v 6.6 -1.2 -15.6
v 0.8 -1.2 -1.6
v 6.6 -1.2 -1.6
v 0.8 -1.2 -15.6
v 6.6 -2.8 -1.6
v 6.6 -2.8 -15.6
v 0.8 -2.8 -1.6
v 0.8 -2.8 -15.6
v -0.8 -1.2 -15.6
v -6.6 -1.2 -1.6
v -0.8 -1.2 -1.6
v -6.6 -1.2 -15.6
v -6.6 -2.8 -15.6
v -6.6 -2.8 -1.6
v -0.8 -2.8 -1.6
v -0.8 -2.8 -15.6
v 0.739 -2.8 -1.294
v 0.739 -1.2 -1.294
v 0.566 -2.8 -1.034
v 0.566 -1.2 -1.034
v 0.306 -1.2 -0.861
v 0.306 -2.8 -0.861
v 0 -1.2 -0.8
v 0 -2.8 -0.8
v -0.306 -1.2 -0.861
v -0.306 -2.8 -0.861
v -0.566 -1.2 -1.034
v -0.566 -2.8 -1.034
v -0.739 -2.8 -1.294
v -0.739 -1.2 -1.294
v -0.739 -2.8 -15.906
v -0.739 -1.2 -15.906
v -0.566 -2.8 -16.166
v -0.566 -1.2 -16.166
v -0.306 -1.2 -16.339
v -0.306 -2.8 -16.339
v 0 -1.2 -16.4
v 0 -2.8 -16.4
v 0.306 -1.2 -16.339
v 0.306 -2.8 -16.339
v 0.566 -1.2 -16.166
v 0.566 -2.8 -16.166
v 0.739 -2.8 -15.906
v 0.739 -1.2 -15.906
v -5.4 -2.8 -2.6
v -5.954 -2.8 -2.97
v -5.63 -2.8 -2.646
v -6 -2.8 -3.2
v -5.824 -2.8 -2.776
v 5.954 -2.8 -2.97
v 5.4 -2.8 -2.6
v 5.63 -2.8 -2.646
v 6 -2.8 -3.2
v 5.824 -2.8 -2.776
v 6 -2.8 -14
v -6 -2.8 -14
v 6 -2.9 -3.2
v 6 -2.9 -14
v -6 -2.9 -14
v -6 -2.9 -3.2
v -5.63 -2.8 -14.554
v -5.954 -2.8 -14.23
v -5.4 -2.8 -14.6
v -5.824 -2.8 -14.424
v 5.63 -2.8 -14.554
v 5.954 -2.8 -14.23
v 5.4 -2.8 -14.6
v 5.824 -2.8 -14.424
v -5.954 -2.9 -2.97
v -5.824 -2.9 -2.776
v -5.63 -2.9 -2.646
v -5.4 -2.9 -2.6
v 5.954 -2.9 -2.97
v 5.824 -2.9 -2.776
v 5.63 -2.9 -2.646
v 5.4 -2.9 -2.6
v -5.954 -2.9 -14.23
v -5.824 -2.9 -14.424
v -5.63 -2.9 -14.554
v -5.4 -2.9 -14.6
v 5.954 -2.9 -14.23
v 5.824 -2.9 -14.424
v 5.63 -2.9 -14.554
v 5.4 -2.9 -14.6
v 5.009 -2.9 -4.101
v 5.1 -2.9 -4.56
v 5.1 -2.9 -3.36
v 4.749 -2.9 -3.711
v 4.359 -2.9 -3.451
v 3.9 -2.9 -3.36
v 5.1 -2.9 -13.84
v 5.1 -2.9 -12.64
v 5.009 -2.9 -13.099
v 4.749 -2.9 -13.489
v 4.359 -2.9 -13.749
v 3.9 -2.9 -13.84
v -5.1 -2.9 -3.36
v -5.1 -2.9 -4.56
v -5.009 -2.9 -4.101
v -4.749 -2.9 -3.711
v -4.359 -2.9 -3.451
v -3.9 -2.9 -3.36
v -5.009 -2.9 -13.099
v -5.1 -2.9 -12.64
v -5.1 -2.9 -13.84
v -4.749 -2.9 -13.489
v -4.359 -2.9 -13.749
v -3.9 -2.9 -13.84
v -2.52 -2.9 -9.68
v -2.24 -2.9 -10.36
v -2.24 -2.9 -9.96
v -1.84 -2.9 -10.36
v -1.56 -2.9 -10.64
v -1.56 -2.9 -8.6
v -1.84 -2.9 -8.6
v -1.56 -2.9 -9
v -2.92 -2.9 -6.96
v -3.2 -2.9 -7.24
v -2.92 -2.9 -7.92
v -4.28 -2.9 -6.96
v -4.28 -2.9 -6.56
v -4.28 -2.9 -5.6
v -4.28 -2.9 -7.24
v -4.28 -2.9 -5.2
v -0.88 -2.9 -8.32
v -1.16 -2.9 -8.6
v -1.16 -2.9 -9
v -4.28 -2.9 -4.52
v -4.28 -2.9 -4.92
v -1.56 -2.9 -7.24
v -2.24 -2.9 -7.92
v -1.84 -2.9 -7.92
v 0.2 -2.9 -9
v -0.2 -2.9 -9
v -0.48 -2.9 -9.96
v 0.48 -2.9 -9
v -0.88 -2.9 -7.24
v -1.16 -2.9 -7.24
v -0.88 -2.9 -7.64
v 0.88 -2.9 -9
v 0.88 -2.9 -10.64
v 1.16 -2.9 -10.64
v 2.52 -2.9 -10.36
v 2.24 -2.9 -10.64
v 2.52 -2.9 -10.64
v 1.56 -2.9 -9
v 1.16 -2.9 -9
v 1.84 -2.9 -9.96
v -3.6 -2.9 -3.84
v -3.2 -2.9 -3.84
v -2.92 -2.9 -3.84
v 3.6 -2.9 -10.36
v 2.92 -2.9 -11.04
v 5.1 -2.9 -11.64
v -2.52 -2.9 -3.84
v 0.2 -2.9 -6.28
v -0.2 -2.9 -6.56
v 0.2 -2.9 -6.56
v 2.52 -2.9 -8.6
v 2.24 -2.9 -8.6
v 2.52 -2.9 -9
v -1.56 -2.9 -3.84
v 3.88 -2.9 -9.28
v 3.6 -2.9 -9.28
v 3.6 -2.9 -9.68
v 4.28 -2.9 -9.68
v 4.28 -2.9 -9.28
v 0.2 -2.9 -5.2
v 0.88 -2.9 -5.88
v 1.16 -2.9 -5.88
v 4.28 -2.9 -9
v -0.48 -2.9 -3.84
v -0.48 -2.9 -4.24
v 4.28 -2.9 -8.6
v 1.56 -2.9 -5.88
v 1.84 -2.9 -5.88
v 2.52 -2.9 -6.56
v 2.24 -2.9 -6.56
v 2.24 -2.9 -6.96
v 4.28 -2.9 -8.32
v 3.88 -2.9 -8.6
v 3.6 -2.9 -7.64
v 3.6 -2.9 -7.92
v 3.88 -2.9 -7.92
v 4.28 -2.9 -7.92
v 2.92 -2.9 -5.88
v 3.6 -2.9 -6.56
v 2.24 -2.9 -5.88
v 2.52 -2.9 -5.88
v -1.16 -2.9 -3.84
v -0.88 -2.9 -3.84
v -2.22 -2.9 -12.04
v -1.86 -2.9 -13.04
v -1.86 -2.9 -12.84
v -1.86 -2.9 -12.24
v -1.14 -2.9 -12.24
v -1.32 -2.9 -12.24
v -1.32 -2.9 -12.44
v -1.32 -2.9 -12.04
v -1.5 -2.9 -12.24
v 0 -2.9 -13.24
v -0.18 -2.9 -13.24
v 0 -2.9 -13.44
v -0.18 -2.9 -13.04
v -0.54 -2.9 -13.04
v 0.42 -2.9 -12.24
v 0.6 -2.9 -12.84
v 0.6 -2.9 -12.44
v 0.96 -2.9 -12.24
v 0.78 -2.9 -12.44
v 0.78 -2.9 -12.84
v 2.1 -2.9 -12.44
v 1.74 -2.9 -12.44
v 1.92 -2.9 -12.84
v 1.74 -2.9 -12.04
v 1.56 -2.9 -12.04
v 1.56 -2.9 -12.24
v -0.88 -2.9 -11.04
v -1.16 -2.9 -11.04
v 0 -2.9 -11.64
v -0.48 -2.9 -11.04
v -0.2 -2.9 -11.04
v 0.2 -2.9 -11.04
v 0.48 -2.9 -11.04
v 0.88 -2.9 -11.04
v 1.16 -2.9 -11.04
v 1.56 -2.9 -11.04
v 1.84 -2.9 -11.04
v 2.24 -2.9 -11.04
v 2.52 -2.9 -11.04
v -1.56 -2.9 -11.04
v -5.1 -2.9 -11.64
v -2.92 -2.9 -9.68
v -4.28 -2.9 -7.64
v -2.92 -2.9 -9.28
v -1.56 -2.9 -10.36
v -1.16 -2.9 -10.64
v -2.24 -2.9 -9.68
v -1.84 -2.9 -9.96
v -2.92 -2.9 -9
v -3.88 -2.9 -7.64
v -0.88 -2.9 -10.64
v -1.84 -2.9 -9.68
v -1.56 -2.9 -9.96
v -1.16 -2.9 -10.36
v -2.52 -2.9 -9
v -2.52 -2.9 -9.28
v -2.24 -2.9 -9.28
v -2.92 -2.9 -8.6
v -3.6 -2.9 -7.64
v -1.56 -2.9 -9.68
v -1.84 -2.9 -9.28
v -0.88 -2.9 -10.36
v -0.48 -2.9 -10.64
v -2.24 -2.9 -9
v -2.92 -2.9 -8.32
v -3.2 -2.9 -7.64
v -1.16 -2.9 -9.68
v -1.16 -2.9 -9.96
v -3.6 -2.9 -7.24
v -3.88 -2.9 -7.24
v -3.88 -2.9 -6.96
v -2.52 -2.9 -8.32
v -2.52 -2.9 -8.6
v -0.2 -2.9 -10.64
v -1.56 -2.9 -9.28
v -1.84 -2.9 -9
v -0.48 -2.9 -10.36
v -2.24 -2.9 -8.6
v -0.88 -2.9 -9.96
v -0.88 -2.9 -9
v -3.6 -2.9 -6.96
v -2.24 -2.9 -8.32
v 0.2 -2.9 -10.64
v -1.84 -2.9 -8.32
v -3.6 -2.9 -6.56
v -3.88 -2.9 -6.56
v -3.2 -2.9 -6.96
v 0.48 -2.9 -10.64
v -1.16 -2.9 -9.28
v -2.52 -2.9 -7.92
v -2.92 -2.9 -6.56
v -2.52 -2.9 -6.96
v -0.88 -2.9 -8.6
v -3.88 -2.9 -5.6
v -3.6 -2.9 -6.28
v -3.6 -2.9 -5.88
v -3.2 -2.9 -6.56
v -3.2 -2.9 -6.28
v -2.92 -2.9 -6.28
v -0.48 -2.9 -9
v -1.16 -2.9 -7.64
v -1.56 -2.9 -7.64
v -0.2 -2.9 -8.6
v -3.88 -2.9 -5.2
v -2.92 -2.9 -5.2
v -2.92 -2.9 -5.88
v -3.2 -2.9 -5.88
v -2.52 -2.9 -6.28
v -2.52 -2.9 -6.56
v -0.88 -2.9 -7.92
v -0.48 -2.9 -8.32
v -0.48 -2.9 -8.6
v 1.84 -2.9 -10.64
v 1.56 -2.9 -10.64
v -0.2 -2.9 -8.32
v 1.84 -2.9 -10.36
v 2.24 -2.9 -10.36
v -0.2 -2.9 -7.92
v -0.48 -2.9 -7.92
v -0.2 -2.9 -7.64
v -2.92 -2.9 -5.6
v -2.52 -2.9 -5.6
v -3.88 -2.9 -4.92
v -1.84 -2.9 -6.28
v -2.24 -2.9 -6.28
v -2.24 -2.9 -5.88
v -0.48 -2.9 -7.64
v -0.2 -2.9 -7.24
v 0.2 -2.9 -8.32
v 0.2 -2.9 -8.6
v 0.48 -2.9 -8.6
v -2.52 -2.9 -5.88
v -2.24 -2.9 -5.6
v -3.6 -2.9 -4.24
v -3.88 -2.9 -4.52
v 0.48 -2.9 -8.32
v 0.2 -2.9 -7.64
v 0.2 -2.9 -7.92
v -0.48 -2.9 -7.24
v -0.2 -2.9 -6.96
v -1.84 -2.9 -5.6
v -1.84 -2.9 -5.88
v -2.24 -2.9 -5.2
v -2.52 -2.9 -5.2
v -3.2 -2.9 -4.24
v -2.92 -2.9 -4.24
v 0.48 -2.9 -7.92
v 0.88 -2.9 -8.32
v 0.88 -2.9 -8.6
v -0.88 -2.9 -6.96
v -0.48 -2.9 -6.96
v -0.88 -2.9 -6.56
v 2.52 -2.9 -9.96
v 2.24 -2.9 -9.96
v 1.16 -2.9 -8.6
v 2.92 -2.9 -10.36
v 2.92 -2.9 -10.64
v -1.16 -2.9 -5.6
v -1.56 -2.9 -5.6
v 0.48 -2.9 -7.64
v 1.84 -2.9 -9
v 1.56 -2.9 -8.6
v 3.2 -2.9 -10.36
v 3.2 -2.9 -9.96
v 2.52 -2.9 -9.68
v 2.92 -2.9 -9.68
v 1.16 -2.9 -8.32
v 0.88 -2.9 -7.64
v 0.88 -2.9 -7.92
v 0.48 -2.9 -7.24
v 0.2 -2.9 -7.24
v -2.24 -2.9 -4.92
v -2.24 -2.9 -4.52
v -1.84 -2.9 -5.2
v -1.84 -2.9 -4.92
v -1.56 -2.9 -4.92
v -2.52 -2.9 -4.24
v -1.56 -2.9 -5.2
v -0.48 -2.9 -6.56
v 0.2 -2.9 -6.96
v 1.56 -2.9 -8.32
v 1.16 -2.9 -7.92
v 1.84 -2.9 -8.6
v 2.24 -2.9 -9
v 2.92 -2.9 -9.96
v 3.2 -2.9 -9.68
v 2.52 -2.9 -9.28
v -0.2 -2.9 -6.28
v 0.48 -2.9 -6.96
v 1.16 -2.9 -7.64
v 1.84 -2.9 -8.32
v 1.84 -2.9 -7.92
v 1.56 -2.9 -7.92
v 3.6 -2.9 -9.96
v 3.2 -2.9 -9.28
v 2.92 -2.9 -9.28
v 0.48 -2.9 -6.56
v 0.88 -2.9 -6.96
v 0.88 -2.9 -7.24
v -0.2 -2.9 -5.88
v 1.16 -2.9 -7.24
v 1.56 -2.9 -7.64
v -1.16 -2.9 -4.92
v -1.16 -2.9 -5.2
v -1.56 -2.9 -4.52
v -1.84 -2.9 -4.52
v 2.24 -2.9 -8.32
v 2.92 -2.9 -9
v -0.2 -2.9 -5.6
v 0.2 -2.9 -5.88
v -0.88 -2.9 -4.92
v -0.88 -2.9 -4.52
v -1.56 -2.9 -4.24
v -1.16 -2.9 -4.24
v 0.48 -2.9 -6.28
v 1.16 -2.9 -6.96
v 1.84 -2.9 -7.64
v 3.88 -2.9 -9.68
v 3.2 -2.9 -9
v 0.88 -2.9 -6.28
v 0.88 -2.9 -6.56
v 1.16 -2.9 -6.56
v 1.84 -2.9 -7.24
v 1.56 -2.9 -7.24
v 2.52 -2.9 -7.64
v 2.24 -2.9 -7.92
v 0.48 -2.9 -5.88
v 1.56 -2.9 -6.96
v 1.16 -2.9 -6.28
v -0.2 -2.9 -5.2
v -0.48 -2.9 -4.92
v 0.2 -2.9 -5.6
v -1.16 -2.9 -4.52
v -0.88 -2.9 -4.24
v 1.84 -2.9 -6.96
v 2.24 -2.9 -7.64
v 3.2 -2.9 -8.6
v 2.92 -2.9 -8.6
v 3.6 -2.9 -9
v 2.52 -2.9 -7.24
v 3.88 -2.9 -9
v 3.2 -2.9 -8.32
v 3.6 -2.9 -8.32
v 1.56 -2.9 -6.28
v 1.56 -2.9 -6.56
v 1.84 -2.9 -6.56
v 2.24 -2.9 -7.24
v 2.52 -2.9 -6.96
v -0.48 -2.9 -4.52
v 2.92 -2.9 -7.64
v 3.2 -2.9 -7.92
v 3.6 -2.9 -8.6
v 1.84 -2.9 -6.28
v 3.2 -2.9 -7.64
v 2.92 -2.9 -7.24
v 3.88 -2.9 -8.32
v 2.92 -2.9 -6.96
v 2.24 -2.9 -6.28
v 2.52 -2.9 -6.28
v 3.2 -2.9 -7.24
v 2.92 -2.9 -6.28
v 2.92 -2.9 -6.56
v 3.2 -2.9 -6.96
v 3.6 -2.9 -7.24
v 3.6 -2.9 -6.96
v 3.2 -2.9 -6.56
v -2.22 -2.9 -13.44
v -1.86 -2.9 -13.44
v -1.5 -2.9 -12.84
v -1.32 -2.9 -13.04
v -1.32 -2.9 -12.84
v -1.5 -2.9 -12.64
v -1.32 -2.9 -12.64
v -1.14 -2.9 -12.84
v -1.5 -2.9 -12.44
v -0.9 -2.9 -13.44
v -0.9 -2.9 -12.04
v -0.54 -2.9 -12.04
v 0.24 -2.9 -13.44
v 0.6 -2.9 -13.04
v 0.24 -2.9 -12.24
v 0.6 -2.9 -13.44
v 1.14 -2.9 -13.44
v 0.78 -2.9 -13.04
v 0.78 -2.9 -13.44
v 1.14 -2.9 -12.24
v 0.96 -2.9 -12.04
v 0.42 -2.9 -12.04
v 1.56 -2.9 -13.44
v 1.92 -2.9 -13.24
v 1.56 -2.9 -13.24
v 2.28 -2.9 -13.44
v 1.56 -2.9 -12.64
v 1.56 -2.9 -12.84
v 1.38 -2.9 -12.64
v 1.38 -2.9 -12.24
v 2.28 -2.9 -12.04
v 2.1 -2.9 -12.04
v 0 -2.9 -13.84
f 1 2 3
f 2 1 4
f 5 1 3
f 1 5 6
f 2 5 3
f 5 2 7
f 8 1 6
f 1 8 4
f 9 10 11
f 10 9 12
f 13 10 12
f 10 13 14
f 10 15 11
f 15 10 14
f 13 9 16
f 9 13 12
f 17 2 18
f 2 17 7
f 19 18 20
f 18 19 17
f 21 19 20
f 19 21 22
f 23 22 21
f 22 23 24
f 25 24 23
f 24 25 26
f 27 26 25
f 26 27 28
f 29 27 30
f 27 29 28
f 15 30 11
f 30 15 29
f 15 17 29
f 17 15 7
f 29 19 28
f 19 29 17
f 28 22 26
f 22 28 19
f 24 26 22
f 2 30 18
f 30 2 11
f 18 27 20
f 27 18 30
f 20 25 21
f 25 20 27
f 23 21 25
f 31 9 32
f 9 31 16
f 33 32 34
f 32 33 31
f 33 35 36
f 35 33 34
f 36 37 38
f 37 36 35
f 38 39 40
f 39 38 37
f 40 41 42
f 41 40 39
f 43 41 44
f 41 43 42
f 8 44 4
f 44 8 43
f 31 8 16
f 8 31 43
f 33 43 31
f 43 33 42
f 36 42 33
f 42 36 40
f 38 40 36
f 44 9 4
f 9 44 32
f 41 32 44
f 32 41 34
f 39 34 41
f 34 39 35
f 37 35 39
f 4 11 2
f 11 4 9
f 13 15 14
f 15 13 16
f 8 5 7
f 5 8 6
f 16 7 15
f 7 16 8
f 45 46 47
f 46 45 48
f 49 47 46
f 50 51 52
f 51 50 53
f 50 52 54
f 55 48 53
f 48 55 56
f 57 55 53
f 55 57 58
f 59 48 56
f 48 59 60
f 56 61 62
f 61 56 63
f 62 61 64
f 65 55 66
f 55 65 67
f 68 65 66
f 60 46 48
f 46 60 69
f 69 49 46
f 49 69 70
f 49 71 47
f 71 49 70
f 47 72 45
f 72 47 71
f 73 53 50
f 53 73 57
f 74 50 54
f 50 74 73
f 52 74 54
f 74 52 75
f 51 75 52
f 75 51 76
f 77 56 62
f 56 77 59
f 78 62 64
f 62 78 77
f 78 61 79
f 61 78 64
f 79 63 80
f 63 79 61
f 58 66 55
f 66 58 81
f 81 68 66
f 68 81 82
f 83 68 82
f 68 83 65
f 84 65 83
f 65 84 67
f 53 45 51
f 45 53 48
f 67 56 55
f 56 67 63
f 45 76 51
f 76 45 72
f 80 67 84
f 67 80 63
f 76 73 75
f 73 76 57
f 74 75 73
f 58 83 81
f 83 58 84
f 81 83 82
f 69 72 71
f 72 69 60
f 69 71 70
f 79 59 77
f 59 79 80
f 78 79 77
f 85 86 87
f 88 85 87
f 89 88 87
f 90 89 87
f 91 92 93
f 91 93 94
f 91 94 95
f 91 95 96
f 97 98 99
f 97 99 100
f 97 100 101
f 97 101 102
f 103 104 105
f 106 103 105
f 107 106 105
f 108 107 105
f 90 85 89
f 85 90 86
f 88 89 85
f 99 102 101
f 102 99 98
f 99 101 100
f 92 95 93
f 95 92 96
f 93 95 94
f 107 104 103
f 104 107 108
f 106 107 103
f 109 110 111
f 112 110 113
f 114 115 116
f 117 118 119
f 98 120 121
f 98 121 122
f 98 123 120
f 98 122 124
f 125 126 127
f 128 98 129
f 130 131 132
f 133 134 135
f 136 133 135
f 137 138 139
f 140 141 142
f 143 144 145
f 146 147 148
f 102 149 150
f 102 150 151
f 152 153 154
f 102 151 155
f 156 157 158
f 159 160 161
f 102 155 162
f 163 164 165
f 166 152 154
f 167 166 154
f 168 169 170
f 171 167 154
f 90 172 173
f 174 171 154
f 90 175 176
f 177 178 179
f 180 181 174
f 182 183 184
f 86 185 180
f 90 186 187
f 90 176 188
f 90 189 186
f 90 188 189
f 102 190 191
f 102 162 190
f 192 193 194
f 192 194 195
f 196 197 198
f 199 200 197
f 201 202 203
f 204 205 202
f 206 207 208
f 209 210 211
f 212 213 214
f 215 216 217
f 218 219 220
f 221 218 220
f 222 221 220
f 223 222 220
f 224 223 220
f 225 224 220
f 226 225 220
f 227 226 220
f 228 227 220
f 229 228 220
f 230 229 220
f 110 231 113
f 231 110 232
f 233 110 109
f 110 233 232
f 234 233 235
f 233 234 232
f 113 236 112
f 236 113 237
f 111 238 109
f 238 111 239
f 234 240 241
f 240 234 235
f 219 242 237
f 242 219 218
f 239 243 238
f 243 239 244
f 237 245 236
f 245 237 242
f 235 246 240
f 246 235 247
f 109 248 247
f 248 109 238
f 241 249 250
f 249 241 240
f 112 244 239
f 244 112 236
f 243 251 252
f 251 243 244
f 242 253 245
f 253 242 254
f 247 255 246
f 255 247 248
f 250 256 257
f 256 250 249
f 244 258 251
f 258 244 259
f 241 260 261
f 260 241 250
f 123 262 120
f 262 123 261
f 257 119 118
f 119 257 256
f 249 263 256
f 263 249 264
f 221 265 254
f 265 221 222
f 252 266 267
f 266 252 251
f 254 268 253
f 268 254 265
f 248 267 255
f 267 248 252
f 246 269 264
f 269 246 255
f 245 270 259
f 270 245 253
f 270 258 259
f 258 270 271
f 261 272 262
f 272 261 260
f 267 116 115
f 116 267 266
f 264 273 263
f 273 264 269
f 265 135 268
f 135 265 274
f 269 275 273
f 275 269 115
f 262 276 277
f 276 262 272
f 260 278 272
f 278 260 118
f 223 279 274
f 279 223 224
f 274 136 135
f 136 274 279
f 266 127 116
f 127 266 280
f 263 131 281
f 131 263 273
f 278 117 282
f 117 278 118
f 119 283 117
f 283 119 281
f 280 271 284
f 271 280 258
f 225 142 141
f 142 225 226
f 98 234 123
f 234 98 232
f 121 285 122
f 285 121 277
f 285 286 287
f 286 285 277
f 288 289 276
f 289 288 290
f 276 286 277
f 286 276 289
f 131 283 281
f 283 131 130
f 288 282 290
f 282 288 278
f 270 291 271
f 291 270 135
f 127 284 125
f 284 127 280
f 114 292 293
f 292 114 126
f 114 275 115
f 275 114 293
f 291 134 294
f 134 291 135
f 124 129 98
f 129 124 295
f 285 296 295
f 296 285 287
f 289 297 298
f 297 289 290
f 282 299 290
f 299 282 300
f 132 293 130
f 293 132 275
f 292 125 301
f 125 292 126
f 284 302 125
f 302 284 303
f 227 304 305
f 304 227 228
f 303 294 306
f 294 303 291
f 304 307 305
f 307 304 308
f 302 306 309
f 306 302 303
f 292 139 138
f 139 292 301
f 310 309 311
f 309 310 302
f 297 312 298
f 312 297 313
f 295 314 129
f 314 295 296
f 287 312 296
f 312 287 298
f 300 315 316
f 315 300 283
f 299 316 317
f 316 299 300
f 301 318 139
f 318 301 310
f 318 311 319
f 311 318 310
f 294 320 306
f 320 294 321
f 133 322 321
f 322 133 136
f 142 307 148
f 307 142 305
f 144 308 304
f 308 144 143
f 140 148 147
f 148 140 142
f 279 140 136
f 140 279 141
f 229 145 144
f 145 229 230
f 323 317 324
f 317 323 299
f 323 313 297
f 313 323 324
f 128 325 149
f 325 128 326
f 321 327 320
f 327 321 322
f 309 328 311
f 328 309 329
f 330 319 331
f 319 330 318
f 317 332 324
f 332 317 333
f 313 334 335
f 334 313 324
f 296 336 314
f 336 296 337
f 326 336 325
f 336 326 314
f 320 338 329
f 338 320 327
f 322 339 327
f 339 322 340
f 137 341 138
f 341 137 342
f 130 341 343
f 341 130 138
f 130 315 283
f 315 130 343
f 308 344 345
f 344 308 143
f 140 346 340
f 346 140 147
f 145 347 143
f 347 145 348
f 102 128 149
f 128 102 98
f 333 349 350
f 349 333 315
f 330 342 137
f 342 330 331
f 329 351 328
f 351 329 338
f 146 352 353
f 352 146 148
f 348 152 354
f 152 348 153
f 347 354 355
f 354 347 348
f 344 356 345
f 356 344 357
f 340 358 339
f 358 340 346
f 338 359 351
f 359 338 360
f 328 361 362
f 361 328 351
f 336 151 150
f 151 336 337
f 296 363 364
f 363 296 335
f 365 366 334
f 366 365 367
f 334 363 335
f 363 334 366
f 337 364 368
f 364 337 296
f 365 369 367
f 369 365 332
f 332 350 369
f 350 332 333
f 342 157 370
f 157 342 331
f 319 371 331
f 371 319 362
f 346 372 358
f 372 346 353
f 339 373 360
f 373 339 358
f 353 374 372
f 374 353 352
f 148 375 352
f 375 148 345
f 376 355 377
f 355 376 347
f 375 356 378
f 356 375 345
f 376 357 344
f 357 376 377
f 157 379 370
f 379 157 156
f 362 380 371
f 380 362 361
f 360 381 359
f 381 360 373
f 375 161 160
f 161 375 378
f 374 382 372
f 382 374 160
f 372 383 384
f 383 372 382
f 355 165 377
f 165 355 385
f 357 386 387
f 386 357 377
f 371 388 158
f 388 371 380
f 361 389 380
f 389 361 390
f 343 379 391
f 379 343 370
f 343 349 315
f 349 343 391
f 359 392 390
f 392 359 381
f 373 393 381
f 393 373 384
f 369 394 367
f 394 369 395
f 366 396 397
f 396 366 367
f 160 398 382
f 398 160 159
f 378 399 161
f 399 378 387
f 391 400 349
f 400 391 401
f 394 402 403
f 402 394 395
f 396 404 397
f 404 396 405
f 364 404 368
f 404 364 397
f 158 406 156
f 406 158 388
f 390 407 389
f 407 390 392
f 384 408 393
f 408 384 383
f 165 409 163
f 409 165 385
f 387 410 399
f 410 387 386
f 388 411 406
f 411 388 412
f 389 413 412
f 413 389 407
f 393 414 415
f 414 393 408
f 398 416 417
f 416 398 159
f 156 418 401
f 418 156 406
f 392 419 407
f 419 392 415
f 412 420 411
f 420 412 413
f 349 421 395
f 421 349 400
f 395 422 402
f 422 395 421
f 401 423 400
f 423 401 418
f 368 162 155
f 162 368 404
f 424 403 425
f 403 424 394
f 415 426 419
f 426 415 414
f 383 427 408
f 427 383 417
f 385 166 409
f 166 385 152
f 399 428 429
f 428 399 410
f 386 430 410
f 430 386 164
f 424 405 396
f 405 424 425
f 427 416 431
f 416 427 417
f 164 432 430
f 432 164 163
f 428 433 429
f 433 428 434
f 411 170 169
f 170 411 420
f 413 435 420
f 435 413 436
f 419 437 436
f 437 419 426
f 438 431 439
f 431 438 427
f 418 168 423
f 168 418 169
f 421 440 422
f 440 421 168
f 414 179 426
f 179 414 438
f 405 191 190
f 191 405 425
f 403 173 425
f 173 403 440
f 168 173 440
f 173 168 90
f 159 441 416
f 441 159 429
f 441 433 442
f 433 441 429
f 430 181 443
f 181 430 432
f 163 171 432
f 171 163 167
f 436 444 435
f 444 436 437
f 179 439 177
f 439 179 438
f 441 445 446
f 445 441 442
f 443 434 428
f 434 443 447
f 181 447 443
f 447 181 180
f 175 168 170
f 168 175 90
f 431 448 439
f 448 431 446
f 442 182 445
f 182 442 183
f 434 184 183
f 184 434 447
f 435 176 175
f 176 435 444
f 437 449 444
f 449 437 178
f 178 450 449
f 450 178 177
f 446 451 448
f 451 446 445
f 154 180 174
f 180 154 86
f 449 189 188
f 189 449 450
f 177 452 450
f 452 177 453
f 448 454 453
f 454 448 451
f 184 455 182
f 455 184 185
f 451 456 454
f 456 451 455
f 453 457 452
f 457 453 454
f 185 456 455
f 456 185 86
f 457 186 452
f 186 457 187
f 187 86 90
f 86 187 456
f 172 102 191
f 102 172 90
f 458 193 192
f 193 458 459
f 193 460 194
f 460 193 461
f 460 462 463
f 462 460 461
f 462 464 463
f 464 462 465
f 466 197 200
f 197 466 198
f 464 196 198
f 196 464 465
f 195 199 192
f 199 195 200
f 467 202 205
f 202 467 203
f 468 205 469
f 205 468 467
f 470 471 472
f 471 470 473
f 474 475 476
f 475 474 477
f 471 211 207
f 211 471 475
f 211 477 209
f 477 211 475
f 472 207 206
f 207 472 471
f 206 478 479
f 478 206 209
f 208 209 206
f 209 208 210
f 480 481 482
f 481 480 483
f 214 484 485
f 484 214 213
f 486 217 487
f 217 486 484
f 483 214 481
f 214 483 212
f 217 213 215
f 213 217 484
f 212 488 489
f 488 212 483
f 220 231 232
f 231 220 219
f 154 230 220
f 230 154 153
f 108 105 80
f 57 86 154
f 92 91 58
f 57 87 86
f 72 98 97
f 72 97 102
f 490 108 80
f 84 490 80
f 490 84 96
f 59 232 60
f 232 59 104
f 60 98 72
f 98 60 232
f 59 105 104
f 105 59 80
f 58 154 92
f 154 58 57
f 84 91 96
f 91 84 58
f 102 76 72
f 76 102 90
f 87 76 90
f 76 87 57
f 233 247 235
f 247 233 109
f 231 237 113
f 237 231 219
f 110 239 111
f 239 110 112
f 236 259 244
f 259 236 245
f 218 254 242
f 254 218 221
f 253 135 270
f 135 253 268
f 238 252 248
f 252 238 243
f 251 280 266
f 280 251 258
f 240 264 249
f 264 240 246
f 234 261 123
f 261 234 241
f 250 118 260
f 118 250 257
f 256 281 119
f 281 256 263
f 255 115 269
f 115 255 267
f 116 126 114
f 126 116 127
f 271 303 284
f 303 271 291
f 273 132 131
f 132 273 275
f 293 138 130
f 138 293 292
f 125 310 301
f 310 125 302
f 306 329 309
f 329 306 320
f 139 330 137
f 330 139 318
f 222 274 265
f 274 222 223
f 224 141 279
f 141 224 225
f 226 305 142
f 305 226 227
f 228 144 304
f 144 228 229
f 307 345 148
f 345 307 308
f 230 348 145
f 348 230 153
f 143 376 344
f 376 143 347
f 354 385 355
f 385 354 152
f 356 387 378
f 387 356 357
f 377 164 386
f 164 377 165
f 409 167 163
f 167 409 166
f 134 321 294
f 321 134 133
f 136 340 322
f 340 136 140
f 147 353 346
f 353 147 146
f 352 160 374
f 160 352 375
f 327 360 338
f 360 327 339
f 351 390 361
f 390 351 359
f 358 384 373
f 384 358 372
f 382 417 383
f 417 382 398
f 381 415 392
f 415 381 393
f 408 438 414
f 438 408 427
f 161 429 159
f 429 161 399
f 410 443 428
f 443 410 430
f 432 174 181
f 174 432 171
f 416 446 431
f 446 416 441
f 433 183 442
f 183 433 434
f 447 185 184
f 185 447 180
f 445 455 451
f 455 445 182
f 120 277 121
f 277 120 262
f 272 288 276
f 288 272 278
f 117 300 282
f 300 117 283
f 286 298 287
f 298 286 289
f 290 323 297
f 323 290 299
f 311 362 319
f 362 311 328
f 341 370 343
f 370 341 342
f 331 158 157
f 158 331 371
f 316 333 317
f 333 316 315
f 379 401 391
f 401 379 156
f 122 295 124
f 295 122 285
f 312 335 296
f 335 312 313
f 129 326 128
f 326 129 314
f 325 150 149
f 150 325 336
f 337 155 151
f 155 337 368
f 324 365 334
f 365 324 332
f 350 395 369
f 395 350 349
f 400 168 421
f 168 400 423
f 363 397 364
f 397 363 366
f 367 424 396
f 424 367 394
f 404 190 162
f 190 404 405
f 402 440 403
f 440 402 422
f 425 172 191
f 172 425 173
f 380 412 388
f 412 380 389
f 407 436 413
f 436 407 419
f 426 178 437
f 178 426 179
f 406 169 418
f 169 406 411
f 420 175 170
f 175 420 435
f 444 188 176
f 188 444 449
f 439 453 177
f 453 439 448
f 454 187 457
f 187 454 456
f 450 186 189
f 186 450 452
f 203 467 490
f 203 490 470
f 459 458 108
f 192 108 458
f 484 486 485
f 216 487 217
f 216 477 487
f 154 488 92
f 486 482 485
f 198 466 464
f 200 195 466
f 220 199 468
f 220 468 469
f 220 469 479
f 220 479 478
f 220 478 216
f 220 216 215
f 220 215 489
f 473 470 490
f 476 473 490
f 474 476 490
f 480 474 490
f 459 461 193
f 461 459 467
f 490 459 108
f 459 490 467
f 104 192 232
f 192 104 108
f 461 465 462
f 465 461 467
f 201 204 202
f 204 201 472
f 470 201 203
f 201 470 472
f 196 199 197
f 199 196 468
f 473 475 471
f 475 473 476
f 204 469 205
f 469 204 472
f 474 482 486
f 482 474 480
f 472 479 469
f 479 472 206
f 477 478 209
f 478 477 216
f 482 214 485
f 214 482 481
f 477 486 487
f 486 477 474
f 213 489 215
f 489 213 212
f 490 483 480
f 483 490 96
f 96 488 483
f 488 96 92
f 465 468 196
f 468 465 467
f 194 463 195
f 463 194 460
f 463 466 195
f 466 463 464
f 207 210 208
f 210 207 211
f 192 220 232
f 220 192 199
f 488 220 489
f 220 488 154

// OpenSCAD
use <../lib.scad>
use <60601.scad>
use <6138629s.scad>
function ldraw_lib__60601d07() = [
// 0 Glass for Window  1 x  2 x  2 with "PLAY" and Pixelated Stay-Puft Logo Sticker
// 0 Name: 60601d07.dat
// 0 Author: Vincent Messenet [Cheenzo]
// 0 !LDRAW_ORG Shortcut UPDATE 2026-02
// 0 !LICENSE Licensed under CC BY 4.0 : see CAreadme.txt
// 
// 0 BFC CERTIFY CCW
  [0,"BFC","CERTIFY"],
  [0,"BFC","CCW"],
// 
// 0 !CATEGORY Sticker Shortcut
// 
// 0 !KEYWORDS Bricklink 60601pb018, Firehouse Headquarters, Ghostbusters
// 0 !KEYWORDS set 75827
// 
// 0 !HISTORY 2026-03-06 [OrionP] Official Update 2026-02
// 
// 1 16 0 0 0 1 0 0 0 1 0 0 0 1 60601.dat
  [1,16,0,0,0,1,0,0,0,1,0,0,0,1, ldraw_lib__60601()],
// 1 16 0 21.5 -7 1 0 0 0 0 -1 0 1 0 6138629s.dat
  [1,16,0,21.5,-7,1,0,0,0,0,-1,0,1,0, ldraw_lib__6138629s()],
];
module ldraw_lib__60601d07(step=0, col=false, unit=2/5, alt=false, line=0.2, solid=!$preview)
    makepoly(ldraw_lib__60601d07(), step=step, col=col, unit=unit, alt=alt, line=line, solid=solid);
ldraw_lib__60601d07(line=0.2);
